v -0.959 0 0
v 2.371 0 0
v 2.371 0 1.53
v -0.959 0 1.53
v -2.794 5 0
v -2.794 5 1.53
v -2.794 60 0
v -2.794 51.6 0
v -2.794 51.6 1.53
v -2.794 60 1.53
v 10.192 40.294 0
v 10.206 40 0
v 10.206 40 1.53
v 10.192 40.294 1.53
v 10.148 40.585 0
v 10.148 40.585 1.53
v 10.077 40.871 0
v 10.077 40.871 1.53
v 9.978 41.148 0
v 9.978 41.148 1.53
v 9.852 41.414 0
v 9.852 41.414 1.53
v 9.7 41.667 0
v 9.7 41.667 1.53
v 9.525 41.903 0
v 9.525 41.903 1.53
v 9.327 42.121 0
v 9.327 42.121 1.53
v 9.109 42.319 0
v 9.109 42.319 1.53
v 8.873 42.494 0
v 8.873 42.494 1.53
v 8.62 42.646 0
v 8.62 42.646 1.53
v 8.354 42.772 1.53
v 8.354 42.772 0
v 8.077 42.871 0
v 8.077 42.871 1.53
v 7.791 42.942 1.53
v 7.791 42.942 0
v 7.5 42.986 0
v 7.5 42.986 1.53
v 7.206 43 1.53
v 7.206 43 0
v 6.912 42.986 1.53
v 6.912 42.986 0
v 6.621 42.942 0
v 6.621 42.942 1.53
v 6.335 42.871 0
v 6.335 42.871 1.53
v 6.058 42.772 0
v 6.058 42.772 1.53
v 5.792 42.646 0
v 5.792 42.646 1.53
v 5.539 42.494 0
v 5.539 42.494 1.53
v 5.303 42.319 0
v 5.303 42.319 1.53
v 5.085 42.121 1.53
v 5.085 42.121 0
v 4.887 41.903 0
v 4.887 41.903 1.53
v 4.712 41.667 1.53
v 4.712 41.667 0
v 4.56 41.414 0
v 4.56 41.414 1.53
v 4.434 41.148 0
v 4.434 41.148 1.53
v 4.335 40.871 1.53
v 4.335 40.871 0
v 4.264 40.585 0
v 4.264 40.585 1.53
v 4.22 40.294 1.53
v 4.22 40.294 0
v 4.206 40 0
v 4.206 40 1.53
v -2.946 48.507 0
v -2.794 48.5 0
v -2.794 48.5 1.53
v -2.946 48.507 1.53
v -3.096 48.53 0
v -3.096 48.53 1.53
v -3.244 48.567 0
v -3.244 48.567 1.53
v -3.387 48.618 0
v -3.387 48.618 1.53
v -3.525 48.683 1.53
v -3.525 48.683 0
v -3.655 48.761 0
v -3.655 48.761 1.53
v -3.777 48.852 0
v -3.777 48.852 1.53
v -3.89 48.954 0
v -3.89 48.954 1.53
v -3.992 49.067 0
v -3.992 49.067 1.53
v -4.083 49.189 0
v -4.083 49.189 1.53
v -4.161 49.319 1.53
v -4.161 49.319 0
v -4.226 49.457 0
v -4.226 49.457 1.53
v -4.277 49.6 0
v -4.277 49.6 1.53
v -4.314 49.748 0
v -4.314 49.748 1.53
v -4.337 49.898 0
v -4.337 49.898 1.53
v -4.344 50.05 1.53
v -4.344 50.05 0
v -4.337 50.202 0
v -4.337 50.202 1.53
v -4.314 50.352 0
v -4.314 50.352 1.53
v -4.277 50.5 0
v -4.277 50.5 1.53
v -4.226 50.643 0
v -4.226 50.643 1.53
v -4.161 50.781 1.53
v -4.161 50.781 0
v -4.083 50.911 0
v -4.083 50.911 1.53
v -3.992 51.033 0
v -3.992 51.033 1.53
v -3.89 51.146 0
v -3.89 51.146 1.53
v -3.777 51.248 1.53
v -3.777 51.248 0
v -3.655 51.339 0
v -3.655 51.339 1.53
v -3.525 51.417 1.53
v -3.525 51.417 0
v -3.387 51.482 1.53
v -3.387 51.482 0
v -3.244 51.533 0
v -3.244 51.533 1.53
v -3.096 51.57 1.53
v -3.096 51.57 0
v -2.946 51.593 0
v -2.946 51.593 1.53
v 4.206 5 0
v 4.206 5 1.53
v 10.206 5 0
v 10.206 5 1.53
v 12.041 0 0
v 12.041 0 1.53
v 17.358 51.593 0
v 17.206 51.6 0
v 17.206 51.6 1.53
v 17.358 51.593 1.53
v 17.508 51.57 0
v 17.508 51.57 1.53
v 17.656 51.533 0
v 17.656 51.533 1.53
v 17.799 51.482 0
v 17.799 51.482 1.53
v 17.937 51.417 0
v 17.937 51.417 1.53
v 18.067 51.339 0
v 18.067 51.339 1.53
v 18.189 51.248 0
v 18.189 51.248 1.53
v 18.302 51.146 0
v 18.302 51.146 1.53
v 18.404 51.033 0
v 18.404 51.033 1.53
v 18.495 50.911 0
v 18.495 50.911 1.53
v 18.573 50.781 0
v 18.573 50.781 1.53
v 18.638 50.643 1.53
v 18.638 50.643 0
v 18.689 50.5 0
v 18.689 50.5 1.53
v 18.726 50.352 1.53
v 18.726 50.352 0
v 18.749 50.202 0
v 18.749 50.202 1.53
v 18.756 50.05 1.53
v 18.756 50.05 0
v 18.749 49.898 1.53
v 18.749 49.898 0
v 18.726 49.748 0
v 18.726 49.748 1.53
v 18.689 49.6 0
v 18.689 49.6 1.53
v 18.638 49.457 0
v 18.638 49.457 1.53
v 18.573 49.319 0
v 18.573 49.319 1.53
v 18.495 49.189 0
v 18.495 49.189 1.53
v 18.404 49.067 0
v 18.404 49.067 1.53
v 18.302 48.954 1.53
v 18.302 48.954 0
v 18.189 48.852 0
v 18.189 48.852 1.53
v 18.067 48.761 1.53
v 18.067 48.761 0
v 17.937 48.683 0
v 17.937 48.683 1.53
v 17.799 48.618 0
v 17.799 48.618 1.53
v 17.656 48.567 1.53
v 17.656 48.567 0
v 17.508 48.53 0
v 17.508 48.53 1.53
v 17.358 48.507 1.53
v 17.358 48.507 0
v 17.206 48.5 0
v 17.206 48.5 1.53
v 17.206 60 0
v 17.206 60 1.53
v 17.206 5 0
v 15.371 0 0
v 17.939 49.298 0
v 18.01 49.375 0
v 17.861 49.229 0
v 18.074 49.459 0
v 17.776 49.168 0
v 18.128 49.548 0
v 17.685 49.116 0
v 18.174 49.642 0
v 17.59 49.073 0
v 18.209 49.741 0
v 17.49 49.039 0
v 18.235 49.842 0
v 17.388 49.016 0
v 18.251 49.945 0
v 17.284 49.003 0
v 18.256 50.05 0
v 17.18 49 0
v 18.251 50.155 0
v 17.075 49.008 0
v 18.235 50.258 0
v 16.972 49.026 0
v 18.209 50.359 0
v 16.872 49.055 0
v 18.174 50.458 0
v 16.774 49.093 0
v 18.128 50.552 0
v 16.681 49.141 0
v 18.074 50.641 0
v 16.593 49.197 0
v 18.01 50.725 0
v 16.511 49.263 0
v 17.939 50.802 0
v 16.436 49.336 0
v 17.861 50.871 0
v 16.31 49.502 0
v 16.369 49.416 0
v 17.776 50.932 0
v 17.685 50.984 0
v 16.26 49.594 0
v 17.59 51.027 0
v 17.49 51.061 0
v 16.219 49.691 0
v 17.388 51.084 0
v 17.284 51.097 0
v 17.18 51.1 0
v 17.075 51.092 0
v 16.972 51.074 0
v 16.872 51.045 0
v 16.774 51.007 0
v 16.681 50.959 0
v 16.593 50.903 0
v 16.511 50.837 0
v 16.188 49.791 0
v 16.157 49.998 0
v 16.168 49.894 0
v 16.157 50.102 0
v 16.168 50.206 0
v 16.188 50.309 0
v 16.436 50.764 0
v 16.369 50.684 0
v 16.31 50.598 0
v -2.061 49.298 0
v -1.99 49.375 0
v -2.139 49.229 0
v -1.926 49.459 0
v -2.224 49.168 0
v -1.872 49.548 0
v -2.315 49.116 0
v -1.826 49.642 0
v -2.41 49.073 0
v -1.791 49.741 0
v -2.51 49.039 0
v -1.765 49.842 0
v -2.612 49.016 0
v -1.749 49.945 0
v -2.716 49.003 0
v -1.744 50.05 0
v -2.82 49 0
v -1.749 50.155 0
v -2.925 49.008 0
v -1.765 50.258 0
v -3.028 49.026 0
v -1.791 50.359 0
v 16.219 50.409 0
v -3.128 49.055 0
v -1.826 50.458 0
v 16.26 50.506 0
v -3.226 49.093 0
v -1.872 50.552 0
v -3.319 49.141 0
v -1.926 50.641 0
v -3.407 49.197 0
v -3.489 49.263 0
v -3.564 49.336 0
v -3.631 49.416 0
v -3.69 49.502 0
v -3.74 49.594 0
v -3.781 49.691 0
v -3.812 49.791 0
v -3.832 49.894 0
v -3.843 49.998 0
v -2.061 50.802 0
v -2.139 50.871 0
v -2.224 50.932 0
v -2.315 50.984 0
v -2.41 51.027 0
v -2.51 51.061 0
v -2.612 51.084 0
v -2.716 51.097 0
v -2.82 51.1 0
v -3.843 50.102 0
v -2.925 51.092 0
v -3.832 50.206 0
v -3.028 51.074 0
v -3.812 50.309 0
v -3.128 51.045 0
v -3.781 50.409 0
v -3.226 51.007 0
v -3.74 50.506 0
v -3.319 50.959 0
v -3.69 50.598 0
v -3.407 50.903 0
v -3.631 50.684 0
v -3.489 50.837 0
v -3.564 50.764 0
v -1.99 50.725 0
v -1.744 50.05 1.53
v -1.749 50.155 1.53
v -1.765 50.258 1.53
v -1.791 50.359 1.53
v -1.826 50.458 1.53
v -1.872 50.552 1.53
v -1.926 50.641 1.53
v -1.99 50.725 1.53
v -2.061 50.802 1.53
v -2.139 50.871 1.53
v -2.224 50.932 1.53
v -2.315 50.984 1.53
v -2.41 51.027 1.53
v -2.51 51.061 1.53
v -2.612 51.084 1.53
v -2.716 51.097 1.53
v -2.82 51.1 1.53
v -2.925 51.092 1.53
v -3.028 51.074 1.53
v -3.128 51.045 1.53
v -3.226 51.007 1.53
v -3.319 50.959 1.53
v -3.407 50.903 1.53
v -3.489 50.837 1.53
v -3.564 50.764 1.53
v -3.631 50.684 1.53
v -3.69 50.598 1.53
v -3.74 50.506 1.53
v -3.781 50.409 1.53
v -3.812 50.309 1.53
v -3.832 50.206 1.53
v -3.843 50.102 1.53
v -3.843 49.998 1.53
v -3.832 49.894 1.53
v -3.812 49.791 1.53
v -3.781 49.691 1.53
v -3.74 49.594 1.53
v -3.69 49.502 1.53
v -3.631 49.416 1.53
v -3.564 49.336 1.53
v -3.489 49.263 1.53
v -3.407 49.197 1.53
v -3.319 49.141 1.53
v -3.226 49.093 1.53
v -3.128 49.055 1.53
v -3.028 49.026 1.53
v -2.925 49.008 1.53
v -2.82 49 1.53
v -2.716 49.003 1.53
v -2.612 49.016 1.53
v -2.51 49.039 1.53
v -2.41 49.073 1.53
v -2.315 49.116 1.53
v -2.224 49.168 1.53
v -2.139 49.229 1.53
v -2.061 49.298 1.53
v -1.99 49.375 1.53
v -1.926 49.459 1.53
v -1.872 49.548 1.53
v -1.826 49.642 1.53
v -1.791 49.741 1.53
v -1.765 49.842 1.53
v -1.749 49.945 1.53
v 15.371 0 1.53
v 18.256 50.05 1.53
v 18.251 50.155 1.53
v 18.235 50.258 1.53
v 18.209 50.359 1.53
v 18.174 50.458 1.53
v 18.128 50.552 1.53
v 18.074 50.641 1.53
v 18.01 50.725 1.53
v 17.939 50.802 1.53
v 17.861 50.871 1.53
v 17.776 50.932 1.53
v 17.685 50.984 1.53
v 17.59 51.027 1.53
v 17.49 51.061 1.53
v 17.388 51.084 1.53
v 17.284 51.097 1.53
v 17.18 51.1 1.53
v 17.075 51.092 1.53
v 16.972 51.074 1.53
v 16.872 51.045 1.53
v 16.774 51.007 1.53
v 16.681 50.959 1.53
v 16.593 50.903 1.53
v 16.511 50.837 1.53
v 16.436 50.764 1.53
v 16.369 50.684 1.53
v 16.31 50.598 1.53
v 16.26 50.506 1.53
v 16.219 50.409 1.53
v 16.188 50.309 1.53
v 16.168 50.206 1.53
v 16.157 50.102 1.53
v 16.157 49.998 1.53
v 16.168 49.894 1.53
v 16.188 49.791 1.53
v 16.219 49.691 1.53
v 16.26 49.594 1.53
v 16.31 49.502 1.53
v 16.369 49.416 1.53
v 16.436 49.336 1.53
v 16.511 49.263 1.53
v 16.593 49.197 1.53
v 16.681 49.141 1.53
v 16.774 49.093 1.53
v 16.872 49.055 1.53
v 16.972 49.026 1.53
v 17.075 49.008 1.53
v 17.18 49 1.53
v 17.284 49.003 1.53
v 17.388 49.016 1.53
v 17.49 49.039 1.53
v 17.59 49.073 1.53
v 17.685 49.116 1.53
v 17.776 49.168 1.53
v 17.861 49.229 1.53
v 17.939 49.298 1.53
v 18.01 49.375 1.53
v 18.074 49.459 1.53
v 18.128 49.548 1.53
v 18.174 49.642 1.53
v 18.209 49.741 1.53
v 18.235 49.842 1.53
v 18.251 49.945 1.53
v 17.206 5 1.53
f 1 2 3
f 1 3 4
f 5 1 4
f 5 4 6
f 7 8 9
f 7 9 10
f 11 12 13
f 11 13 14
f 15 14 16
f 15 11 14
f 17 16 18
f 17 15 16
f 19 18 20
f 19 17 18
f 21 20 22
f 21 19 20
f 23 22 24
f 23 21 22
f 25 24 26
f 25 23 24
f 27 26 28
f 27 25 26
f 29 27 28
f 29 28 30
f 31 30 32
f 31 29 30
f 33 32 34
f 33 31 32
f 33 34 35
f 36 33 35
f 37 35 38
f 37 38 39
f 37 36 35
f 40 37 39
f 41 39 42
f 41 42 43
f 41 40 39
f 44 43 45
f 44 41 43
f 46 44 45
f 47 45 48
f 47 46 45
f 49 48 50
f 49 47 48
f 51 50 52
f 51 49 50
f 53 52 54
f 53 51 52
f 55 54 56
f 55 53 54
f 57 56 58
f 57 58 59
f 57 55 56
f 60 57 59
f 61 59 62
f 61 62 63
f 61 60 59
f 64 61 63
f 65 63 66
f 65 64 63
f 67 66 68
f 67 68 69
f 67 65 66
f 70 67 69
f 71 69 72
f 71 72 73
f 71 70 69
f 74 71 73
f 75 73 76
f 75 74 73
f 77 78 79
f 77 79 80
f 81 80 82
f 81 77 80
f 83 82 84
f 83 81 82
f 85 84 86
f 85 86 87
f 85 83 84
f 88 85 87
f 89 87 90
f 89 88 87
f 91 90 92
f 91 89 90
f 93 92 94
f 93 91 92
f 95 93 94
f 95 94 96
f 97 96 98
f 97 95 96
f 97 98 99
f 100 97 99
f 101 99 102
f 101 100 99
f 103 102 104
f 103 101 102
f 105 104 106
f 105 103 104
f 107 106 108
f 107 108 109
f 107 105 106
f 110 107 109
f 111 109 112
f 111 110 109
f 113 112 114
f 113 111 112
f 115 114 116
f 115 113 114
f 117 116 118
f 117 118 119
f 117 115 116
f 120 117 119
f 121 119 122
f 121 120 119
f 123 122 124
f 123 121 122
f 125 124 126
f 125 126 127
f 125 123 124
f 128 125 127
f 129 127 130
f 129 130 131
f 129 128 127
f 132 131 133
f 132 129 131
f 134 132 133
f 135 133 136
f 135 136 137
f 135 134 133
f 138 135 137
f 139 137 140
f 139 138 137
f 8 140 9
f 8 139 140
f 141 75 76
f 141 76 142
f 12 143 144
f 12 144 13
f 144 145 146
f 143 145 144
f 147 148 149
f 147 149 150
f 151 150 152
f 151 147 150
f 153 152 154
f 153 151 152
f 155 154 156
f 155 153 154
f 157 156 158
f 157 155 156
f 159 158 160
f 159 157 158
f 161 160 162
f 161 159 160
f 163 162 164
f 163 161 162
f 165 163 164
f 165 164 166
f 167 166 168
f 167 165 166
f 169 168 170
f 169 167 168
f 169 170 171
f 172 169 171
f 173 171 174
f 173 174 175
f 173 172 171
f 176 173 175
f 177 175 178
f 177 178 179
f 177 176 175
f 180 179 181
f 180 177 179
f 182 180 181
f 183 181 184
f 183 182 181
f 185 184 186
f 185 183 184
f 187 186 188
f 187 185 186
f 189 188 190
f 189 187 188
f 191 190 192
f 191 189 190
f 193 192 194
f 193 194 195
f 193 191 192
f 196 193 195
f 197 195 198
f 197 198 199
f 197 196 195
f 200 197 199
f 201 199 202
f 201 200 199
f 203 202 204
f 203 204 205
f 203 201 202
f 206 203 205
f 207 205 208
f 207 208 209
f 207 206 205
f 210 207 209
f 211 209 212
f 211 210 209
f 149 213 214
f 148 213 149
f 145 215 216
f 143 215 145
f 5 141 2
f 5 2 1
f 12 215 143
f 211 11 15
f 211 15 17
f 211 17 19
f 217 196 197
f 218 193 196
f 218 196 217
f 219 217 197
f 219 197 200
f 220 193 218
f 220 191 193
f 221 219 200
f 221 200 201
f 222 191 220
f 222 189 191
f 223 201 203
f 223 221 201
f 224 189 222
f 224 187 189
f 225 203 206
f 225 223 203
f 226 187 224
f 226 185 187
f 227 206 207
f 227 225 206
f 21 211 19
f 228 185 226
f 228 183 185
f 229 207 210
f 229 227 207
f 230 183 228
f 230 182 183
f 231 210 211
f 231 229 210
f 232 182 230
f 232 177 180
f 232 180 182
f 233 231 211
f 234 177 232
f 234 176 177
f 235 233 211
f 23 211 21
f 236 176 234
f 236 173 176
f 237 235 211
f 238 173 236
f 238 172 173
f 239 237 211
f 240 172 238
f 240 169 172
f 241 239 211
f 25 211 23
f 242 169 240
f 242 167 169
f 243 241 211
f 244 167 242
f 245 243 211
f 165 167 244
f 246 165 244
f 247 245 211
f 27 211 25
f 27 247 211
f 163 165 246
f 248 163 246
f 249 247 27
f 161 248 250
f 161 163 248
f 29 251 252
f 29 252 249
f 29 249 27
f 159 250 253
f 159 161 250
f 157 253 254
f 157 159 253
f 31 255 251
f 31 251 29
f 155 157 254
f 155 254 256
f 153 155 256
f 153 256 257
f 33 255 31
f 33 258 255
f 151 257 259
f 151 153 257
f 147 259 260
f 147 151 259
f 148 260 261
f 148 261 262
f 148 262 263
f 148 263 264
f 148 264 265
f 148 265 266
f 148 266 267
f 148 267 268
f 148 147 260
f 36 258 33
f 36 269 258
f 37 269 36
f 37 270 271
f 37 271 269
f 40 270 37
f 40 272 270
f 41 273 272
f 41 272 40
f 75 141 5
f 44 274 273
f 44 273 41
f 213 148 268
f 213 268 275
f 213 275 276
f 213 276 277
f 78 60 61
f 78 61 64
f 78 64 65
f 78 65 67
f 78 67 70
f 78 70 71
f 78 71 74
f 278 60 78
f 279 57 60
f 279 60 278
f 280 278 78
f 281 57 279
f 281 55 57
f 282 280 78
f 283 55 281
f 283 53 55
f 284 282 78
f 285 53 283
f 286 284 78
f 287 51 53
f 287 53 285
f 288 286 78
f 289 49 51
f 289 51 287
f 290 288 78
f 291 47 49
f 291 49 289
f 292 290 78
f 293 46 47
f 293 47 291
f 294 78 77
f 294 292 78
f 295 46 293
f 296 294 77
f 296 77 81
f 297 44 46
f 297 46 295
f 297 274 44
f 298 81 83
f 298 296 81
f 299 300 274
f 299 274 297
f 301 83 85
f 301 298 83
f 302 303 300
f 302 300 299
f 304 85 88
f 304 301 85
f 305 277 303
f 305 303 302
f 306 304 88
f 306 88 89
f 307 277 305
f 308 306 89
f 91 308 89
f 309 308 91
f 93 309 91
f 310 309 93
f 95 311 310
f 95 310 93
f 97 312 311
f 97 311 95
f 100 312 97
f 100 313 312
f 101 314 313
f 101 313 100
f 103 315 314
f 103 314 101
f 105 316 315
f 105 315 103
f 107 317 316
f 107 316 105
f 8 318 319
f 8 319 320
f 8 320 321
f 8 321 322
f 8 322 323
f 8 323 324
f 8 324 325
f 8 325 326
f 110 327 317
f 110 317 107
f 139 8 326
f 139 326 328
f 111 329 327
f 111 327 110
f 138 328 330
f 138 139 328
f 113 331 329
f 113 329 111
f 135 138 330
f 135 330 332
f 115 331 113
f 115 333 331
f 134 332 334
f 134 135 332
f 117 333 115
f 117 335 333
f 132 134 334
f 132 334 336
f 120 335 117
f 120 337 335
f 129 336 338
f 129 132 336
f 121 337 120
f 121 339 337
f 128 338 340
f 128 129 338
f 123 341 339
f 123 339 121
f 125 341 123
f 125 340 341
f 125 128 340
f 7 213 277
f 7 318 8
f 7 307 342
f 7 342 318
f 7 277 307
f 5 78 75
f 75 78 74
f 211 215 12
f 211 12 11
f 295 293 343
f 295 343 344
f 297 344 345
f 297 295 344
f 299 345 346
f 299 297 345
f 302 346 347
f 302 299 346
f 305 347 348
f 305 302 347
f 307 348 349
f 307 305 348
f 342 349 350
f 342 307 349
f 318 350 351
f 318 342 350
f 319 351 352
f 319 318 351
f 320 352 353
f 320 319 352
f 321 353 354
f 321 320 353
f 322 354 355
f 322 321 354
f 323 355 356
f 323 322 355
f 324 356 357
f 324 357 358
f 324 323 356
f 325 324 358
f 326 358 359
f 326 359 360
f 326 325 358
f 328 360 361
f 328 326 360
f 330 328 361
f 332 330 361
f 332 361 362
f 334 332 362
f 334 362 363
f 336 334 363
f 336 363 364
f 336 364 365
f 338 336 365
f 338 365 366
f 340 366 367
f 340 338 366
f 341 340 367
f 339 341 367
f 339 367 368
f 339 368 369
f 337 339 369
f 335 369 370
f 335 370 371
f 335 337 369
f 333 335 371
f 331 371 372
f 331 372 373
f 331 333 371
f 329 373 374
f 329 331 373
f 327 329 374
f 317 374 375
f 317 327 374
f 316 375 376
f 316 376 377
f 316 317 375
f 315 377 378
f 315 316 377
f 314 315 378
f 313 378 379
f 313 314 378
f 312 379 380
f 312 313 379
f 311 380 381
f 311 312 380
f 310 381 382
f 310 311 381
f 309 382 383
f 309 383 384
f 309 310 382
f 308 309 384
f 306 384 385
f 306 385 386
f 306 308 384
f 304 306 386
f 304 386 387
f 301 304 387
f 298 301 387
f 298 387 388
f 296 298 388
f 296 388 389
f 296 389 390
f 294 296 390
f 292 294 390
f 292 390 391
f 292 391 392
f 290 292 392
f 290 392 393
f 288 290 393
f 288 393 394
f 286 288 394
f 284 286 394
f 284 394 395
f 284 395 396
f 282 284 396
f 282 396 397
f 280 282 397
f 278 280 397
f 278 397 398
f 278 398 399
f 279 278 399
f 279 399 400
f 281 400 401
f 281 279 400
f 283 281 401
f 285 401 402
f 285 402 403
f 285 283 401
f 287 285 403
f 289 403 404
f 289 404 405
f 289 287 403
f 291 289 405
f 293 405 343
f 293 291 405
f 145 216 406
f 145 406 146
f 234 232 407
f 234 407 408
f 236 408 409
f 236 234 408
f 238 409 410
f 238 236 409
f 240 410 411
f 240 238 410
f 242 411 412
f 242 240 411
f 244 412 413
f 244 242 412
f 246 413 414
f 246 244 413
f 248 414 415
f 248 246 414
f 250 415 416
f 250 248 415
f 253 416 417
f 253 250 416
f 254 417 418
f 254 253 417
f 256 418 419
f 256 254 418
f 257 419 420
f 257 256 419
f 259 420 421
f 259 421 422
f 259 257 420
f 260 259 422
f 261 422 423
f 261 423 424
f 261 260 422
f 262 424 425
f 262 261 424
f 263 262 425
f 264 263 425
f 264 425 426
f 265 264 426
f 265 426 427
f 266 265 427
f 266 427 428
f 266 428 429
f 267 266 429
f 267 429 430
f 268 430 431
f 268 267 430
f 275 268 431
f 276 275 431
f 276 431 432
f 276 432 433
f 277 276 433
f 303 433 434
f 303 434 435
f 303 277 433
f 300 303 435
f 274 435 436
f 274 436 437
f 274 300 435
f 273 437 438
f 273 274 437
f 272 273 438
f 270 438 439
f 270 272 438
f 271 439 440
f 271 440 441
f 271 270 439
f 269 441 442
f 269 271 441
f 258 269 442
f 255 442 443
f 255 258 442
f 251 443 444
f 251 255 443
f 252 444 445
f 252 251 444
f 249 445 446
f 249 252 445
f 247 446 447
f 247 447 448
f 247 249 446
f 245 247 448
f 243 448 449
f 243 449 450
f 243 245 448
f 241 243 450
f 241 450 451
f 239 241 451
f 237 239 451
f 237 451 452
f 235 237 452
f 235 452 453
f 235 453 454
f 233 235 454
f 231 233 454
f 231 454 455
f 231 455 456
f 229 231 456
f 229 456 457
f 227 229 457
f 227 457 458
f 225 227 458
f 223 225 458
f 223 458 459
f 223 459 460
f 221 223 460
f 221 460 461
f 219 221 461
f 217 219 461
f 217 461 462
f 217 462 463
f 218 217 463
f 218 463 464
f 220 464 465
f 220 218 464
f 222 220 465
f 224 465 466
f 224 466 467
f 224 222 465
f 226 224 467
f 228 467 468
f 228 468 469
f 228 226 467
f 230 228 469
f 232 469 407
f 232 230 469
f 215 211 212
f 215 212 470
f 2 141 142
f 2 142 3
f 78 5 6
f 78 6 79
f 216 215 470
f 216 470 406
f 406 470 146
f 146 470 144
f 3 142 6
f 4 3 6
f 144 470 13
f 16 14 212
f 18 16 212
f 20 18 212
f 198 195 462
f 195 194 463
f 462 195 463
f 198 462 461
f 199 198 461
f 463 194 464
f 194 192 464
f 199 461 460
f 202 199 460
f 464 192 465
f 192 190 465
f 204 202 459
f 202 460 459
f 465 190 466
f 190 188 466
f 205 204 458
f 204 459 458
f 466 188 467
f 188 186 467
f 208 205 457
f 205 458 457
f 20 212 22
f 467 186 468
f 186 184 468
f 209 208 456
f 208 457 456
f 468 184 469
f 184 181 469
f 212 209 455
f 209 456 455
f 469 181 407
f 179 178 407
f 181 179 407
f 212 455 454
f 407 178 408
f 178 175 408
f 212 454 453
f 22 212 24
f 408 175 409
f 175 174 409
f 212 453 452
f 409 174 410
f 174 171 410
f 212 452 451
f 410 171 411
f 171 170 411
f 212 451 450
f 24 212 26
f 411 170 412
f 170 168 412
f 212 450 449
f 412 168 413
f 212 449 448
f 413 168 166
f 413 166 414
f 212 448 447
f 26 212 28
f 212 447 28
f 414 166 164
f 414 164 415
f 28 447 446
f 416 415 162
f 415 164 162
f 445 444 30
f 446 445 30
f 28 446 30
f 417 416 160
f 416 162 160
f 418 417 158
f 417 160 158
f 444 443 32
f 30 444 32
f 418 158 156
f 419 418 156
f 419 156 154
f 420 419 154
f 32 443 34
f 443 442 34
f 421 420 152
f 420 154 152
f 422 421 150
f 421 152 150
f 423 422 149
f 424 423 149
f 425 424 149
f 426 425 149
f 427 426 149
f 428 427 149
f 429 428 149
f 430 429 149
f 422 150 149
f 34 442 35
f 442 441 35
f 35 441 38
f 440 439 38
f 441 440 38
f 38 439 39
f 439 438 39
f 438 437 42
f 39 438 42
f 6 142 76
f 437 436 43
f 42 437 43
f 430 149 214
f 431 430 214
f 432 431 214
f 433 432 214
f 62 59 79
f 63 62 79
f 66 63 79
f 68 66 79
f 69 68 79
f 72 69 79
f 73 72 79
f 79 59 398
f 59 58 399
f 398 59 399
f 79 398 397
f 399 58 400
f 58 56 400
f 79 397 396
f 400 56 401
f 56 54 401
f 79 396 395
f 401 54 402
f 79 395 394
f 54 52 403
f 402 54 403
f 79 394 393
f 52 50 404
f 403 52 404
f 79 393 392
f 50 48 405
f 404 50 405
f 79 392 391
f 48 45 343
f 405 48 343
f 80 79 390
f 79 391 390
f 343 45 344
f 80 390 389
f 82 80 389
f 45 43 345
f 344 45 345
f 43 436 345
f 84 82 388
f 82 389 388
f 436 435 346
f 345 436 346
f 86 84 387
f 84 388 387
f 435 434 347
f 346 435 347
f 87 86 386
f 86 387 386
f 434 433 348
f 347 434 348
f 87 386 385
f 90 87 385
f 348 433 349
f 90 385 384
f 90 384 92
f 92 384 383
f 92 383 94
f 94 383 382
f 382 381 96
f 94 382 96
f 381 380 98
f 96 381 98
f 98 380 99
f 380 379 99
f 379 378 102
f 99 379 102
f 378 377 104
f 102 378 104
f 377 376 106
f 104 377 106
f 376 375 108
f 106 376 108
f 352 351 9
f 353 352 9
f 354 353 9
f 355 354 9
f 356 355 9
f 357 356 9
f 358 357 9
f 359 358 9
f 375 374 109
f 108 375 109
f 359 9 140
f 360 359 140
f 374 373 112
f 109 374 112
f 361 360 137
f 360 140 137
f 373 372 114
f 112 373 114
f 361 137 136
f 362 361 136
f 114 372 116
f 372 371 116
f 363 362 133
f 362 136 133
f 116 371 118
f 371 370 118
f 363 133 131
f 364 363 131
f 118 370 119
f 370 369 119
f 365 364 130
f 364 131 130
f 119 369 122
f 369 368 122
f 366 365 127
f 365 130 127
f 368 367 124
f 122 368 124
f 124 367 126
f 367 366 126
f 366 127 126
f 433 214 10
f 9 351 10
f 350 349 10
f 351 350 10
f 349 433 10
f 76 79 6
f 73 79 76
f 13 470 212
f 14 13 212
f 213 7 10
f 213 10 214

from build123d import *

# Parameters (mm, degrees)
ESQUISSE1_R        = 1.05
BOSS_EXTRU_1_DEPTH = 1.53


with BuildPart() as part:
    # Esquisse1 → Boss.-Extru.1 (new body)
    with BuildSketch(Plane.XY):
        with BuildLine():
            Line((10.206015929, 5), (10.206015929, 40))
            ThreePointArc((10.206015929, 40), (7.206015929, 43), (4.206015929, 40))
            Line((4.206015929, 40), (4.206015929, 5))
            Line((4.206015929, 5), (2.371015929, 0))
            Line((2.371015929, 0), (0.706015929, 0))
            Line((0.706015929, 0), (-0.958984071, 0))
            Line((-0.958984071, 0), (-2.793984071, 5))
            Line((-2.793984071, 5), (-2.793984071, 48.5))
            ThreePointArc((-2.793984071, 48.5), (-4.343984071, 50.05), (-2.793984071, 51.6))
            Line((-2.793984071, 51.6), (-2.793984071, 60))
            Line((-2.793984071, 60), (17.206015929, 60))
            Line((17.206015929, 60), (17.206015929, 51.6))
            ThreePointArc((17.206015929, 51.6), (18.756015929, 50.05), (17.206015929, 48.5))
            Line((17.206015929, 48.5), (17.206015929, 5))
            Line((17.206015929, 5), (15.371015929, 0))
            Line((15.371015929, 0), (13.706015929, 0))
            Line((13.706015929, 0), (12.041015929, 0))
            Line((12.041015929, 0), (10.206015929, 5))
        make_face()
        with Locations((17.206015929, 50.05)):
            Circle(ESQUISSE1_R, mode=Mode.SUBTRACT)
        with Locations((-2.793984071, 50.05)):
            Circle(ESQUISSE1_R, mode=Mode.SUBTRACT)
    extrude(amount=BOSS_EXTRU_1_DEPTH)


solid = part.part
